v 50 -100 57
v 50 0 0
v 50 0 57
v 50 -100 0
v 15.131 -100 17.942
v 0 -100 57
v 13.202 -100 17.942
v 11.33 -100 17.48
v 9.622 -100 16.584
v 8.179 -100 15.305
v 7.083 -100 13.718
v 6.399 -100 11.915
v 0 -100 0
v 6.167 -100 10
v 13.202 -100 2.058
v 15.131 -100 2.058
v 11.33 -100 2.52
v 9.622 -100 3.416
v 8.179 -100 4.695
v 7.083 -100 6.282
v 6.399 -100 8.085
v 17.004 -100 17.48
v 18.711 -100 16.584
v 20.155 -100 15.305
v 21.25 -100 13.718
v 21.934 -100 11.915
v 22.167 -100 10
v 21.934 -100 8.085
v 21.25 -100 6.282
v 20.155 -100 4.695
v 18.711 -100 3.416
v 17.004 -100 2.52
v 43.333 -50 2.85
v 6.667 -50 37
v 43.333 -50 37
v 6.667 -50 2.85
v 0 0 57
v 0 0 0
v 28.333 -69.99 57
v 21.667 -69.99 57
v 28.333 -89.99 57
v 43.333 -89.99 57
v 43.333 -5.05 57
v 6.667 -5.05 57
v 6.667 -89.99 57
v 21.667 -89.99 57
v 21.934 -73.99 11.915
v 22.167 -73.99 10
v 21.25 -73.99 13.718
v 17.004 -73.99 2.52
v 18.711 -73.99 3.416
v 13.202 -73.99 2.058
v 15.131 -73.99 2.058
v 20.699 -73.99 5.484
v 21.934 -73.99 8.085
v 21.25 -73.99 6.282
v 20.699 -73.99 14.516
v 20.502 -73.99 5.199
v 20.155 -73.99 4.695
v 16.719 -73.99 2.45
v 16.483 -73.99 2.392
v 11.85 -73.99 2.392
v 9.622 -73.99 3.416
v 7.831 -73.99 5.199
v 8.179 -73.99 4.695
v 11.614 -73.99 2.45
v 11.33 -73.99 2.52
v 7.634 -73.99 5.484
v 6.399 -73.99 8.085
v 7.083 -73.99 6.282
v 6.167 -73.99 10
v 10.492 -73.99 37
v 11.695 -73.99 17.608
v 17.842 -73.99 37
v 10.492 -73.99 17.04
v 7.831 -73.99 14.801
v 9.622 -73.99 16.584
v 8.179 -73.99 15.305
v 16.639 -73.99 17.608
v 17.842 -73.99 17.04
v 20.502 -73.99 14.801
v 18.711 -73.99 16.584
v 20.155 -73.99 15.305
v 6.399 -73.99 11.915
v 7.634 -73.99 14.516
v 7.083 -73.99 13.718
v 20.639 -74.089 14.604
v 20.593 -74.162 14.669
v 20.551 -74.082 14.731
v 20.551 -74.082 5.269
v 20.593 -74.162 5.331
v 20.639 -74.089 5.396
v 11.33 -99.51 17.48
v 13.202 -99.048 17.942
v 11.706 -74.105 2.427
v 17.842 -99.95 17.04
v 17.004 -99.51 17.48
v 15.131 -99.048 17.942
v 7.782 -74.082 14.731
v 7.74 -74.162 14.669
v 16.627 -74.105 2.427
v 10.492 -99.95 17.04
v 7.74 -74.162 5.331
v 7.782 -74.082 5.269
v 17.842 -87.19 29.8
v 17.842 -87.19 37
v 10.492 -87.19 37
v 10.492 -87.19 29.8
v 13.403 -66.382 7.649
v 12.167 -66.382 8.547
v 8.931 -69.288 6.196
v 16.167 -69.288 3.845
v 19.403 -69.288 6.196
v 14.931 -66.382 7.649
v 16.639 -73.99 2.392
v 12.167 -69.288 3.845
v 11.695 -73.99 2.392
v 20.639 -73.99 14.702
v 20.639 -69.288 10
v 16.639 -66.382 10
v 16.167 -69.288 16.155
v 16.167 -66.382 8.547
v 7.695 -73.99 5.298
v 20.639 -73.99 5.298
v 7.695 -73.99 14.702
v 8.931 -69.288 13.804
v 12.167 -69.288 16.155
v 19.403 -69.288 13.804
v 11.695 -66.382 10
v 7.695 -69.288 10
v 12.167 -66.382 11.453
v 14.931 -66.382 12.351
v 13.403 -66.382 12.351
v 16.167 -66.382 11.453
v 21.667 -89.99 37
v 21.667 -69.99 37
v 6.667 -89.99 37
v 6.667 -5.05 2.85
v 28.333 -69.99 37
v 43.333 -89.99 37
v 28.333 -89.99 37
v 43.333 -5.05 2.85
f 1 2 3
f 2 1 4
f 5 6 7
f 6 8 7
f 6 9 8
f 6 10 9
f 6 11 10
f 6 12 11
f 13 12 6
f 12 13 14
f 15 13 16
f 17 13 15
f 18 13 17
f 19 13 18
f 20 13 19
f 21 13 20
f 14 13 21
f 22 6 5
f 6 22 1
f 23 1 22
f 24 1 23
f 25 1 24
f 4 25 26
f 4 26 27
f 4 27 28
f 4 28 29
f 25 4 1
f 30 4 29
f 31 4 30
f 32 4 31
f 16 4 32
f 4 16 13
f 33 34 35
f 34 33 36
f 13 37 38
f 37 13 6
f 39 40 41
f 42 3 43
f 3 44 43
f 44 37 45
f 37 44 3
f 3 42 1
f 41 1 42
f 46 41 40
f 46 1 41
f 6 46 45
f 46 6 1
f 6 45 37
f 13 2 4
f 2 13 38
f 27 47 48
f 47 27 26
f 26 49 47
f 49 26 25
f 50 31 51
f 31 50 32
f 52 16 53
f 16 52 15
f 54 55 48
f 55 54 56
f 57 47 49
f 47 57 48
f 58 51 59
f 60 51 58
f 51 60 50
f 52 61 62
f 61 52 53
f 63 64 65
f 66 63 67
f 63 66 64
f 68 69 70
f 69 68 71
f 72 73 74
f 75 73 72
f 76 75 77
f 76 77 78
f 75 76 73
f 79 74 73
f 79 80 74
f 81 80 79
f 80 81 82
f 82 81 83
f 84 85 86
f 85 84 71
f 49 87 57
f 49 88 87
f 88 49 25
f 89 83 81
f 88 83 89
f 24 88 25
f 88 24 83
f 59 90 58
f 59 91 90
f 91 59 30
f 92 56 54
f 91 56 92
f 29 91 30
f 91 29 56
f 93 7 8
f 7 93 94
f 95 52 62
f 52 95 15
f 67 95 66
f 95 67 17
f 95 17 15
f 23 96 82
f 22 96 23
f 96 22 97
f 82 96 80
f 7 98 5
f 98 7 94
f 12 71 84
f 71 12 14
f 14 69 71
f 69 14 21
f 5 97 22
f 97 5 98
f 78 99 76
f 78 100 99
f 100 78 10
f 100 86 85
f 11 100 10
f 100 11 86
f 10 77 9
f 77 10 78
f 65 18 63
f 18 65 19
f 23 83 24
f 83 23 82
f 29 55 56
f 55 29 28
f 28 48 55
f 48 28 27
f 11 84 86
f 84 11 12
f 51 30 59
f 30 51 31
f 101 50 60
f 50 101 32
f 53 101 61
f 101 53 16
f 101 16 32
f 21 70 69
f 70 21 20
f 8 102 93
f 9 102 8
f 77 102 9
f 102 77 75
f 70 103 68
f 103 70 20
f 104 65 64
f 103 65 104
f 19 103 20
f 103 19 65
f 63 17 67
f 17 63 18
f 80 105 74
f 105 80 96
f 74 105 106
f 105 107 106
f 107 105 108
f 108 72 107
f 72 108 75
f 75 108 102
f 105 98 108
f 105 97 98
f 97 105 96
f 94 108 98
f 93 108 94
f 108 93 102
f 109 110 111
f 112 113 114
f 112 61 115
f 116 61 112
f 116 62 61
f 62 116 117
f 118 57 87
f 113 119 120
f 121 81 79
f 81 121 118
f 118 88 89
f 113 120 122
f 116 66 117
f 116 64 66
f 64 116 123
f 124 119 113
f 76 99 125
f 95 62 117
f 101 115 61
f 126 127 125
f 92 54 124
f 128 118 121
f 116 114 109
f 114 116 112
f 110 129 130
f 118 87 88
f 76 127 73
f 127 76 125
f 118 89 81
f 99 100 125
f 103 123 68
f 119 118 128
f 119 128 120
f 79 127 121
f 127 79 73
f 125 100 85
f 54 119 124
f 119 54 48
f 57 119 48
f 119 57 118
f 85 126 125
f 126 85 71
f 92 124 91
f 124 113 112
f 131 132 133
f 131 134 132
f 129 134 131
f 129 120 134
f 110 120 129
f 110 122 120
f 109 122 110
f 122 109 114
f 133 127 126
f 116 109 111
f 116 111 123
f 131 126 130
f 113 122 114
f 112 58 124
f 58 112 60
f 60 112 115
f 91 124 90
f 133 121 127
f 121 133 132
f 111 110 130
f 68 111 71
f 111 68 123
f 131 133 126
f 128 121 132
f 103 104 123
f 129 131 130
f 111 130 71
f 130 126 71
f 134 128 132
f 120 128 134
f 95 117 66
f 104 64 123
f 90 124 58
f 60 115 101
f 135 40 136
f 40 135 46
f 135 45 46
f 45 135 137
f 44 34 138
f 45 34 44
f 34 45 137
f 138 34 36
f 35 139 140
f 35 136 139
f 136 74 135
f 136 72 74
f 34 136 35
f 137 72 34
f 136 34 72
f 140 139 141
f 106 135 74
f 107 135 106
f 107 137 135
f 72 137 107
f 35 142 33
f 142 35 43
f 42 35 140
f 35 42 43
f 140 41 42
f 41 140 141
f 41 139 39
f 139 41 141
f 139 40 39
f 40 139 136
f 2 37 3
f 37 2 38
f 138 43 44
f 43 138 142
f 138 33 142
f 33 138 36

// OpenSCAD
// This is a charger stand for a set of ``Backbeat Go'' headphones by Plantronics.
//
// (C) 20141007 Anders Breindahl <skrewz@skrewz.net>
// Licensed under the GPLv3+.

// Special variables for fragment rendering: {{{
//$fa
// is the angle of the fragments. It sets the minimum angle for a fragment. Even
// a huge circle does not have more fragments than 360 divided by this number.
// The default value is 12 (i.e. 30 fragments for a full circle).
//$fs
// is the size of the fragments and defines the minimum size of a fragment.
// Because of this variable very small circles have a smaller number of
// fragments then specified using $fa. The default value is 1.
//$fn
// is the number of fragments. It usually is 0. When this variable has a value
// greater than zero, the other two variables are ignored and full cirle is
// rendered using this number of fragments. The default value is 0.
// }}}

prod_run=true;

grid_size=50;

case_square_masurement=50;
cutout_depth=20;
cutout_width=15;
cutout_height=40;

cutout_side_inset = (case_square_masurement-2*cutout_width)/3;
cutout_bottom_inset = (case_square_masurement-cutout_height)/2;

plug_actual_width=12;
plug_actual_length=17;
plug_actual_height=7;

mounthole_radius = 8;

case_length=24+plug_actual_length+2*mounthole_radius;

module plug()
{ // {{{
  // microusb hardwired in, here.
  color("black") cube(size=[plug_actual_height,plug_actual_length,plug_actual_width]);
  color("silver") translate([plug_actual_height/2-0.5,plug_actual_length,plug_actual_width/2-3.5]) cube(size=[1,10,7]);

  color("black")
    intersection()
    {
      translate ([-plug_actual_height/2,-2*0.99*plug_actual_length,0]) cube(size=[2*plug_actual_height,2*plug_actual_length,plug_actual_width]);
      translate([plug_actual_height/2,0,14])
        rotate([0,270,0])
          rotate_extrude(convexity=10)
            translate([7,0,0])
              circle(r=1,$fn=8);
    }

} // }}}

module dock()
{ // {{{
  cutout_bottom_inset = -0.01;
  cylinder_shortened_by = 10;

  plughole_height = plug_actual_height * 1.05;
  plughole_width = plug_actual_width * 1.1;
  plughole_length = plug_actual_length * 1.1;


  // the placement of the plug
  if (!prod_run) {
    translate([cutout_side_inset+(cutout_width/2), cylinder_shortened_by, cutout_bottom_inset+0.6*cutout_height])
      translate([-plug_actual_height/2+(plughole_height-plug_actual_height)/2,mounthole_radius,(plughole_width-plug_actual_width)/2])
      plug();
  }

  difference() {
    cube (size=[case_square_masurement, case_length, case_square_masurement]);

    // these constitute the plug hole:
    translate([cutout_side_inset+(cutout_width/2), cylinder_shortened_by, cutout_bottom_inset+0.6*cutout_height]) rotate([0, 0, 0]) cylinder(r=mounthole_radius, h=case_length);
    translate([cutout_side_inset+(cutout_width/2), cylinder_shortened_by, cutout_bottom_inset+0.6*cutout_height]) translate([-plughole_height/2,0,0]) cube(size=[plughole_height,case_length,plughole_width]);
    translate([cutout_side_inset+(cutout_width/2), cylinder_shortened_by, cutout_bottom_inset+0.6*cutout_height]) translate([-plughole_height/2,0.5*plughole_width,0]) rotate([135, 0, 0]) translate([0, 0, -sqrt(2*plughole_width*plughole_width)]) cube(size=[plughole_height,plughole_length,plughole_width]);
    translate([cutout_side_inset+(cutout_width/2), cylinder_shortened_by, cutout_bottom_inset+0.6*cutout_height]) sphere(r=mounthole_radius,$fn=10);

    // these are the cutouts themselves:
    translate([cutout_side_inset, case_length-cutout_depth, cutout_bottom_inset])  cube (size=[cutout_width, 2*cutout_depth, cutout_height]);
    translate([case_square_masurement-cutout_side_inset-cutout_width, case_length-cutout_depth, cutout_bottom_inset])  cube (size=[cutout_width, 2*cutout_depth, cutout_height]);
    translate([cutout_side_inset/2+cutout_width, case_length-cutout_depth, cutout_bottom_inset])  cube (size=[2*cutout_side_inset, 2*cutout_depth, 0.5*cutout_height]);
  }

} // }}}

module cable_stowaway()
{ // {{{
  difference() {
    cube (size=[case_square_masurement, case_length, case_square_masurement]);
    translate([cutout_side_inset, 0.05*case_length, 0.1*case_square_masurement+0.001*case_square_masurement]) 
      cube (size=[case_square_masurement-2*cutout_side_inset, 2*case_length, case_square_masurement]);
  }
} // }}}



rotate([90,0,0])
{
  translate([0, 0, case_square_masurement])
  {
    dock();
  }
  cable_stowaway();
}


// vim: ft=openscad fdm=marker fml=1
